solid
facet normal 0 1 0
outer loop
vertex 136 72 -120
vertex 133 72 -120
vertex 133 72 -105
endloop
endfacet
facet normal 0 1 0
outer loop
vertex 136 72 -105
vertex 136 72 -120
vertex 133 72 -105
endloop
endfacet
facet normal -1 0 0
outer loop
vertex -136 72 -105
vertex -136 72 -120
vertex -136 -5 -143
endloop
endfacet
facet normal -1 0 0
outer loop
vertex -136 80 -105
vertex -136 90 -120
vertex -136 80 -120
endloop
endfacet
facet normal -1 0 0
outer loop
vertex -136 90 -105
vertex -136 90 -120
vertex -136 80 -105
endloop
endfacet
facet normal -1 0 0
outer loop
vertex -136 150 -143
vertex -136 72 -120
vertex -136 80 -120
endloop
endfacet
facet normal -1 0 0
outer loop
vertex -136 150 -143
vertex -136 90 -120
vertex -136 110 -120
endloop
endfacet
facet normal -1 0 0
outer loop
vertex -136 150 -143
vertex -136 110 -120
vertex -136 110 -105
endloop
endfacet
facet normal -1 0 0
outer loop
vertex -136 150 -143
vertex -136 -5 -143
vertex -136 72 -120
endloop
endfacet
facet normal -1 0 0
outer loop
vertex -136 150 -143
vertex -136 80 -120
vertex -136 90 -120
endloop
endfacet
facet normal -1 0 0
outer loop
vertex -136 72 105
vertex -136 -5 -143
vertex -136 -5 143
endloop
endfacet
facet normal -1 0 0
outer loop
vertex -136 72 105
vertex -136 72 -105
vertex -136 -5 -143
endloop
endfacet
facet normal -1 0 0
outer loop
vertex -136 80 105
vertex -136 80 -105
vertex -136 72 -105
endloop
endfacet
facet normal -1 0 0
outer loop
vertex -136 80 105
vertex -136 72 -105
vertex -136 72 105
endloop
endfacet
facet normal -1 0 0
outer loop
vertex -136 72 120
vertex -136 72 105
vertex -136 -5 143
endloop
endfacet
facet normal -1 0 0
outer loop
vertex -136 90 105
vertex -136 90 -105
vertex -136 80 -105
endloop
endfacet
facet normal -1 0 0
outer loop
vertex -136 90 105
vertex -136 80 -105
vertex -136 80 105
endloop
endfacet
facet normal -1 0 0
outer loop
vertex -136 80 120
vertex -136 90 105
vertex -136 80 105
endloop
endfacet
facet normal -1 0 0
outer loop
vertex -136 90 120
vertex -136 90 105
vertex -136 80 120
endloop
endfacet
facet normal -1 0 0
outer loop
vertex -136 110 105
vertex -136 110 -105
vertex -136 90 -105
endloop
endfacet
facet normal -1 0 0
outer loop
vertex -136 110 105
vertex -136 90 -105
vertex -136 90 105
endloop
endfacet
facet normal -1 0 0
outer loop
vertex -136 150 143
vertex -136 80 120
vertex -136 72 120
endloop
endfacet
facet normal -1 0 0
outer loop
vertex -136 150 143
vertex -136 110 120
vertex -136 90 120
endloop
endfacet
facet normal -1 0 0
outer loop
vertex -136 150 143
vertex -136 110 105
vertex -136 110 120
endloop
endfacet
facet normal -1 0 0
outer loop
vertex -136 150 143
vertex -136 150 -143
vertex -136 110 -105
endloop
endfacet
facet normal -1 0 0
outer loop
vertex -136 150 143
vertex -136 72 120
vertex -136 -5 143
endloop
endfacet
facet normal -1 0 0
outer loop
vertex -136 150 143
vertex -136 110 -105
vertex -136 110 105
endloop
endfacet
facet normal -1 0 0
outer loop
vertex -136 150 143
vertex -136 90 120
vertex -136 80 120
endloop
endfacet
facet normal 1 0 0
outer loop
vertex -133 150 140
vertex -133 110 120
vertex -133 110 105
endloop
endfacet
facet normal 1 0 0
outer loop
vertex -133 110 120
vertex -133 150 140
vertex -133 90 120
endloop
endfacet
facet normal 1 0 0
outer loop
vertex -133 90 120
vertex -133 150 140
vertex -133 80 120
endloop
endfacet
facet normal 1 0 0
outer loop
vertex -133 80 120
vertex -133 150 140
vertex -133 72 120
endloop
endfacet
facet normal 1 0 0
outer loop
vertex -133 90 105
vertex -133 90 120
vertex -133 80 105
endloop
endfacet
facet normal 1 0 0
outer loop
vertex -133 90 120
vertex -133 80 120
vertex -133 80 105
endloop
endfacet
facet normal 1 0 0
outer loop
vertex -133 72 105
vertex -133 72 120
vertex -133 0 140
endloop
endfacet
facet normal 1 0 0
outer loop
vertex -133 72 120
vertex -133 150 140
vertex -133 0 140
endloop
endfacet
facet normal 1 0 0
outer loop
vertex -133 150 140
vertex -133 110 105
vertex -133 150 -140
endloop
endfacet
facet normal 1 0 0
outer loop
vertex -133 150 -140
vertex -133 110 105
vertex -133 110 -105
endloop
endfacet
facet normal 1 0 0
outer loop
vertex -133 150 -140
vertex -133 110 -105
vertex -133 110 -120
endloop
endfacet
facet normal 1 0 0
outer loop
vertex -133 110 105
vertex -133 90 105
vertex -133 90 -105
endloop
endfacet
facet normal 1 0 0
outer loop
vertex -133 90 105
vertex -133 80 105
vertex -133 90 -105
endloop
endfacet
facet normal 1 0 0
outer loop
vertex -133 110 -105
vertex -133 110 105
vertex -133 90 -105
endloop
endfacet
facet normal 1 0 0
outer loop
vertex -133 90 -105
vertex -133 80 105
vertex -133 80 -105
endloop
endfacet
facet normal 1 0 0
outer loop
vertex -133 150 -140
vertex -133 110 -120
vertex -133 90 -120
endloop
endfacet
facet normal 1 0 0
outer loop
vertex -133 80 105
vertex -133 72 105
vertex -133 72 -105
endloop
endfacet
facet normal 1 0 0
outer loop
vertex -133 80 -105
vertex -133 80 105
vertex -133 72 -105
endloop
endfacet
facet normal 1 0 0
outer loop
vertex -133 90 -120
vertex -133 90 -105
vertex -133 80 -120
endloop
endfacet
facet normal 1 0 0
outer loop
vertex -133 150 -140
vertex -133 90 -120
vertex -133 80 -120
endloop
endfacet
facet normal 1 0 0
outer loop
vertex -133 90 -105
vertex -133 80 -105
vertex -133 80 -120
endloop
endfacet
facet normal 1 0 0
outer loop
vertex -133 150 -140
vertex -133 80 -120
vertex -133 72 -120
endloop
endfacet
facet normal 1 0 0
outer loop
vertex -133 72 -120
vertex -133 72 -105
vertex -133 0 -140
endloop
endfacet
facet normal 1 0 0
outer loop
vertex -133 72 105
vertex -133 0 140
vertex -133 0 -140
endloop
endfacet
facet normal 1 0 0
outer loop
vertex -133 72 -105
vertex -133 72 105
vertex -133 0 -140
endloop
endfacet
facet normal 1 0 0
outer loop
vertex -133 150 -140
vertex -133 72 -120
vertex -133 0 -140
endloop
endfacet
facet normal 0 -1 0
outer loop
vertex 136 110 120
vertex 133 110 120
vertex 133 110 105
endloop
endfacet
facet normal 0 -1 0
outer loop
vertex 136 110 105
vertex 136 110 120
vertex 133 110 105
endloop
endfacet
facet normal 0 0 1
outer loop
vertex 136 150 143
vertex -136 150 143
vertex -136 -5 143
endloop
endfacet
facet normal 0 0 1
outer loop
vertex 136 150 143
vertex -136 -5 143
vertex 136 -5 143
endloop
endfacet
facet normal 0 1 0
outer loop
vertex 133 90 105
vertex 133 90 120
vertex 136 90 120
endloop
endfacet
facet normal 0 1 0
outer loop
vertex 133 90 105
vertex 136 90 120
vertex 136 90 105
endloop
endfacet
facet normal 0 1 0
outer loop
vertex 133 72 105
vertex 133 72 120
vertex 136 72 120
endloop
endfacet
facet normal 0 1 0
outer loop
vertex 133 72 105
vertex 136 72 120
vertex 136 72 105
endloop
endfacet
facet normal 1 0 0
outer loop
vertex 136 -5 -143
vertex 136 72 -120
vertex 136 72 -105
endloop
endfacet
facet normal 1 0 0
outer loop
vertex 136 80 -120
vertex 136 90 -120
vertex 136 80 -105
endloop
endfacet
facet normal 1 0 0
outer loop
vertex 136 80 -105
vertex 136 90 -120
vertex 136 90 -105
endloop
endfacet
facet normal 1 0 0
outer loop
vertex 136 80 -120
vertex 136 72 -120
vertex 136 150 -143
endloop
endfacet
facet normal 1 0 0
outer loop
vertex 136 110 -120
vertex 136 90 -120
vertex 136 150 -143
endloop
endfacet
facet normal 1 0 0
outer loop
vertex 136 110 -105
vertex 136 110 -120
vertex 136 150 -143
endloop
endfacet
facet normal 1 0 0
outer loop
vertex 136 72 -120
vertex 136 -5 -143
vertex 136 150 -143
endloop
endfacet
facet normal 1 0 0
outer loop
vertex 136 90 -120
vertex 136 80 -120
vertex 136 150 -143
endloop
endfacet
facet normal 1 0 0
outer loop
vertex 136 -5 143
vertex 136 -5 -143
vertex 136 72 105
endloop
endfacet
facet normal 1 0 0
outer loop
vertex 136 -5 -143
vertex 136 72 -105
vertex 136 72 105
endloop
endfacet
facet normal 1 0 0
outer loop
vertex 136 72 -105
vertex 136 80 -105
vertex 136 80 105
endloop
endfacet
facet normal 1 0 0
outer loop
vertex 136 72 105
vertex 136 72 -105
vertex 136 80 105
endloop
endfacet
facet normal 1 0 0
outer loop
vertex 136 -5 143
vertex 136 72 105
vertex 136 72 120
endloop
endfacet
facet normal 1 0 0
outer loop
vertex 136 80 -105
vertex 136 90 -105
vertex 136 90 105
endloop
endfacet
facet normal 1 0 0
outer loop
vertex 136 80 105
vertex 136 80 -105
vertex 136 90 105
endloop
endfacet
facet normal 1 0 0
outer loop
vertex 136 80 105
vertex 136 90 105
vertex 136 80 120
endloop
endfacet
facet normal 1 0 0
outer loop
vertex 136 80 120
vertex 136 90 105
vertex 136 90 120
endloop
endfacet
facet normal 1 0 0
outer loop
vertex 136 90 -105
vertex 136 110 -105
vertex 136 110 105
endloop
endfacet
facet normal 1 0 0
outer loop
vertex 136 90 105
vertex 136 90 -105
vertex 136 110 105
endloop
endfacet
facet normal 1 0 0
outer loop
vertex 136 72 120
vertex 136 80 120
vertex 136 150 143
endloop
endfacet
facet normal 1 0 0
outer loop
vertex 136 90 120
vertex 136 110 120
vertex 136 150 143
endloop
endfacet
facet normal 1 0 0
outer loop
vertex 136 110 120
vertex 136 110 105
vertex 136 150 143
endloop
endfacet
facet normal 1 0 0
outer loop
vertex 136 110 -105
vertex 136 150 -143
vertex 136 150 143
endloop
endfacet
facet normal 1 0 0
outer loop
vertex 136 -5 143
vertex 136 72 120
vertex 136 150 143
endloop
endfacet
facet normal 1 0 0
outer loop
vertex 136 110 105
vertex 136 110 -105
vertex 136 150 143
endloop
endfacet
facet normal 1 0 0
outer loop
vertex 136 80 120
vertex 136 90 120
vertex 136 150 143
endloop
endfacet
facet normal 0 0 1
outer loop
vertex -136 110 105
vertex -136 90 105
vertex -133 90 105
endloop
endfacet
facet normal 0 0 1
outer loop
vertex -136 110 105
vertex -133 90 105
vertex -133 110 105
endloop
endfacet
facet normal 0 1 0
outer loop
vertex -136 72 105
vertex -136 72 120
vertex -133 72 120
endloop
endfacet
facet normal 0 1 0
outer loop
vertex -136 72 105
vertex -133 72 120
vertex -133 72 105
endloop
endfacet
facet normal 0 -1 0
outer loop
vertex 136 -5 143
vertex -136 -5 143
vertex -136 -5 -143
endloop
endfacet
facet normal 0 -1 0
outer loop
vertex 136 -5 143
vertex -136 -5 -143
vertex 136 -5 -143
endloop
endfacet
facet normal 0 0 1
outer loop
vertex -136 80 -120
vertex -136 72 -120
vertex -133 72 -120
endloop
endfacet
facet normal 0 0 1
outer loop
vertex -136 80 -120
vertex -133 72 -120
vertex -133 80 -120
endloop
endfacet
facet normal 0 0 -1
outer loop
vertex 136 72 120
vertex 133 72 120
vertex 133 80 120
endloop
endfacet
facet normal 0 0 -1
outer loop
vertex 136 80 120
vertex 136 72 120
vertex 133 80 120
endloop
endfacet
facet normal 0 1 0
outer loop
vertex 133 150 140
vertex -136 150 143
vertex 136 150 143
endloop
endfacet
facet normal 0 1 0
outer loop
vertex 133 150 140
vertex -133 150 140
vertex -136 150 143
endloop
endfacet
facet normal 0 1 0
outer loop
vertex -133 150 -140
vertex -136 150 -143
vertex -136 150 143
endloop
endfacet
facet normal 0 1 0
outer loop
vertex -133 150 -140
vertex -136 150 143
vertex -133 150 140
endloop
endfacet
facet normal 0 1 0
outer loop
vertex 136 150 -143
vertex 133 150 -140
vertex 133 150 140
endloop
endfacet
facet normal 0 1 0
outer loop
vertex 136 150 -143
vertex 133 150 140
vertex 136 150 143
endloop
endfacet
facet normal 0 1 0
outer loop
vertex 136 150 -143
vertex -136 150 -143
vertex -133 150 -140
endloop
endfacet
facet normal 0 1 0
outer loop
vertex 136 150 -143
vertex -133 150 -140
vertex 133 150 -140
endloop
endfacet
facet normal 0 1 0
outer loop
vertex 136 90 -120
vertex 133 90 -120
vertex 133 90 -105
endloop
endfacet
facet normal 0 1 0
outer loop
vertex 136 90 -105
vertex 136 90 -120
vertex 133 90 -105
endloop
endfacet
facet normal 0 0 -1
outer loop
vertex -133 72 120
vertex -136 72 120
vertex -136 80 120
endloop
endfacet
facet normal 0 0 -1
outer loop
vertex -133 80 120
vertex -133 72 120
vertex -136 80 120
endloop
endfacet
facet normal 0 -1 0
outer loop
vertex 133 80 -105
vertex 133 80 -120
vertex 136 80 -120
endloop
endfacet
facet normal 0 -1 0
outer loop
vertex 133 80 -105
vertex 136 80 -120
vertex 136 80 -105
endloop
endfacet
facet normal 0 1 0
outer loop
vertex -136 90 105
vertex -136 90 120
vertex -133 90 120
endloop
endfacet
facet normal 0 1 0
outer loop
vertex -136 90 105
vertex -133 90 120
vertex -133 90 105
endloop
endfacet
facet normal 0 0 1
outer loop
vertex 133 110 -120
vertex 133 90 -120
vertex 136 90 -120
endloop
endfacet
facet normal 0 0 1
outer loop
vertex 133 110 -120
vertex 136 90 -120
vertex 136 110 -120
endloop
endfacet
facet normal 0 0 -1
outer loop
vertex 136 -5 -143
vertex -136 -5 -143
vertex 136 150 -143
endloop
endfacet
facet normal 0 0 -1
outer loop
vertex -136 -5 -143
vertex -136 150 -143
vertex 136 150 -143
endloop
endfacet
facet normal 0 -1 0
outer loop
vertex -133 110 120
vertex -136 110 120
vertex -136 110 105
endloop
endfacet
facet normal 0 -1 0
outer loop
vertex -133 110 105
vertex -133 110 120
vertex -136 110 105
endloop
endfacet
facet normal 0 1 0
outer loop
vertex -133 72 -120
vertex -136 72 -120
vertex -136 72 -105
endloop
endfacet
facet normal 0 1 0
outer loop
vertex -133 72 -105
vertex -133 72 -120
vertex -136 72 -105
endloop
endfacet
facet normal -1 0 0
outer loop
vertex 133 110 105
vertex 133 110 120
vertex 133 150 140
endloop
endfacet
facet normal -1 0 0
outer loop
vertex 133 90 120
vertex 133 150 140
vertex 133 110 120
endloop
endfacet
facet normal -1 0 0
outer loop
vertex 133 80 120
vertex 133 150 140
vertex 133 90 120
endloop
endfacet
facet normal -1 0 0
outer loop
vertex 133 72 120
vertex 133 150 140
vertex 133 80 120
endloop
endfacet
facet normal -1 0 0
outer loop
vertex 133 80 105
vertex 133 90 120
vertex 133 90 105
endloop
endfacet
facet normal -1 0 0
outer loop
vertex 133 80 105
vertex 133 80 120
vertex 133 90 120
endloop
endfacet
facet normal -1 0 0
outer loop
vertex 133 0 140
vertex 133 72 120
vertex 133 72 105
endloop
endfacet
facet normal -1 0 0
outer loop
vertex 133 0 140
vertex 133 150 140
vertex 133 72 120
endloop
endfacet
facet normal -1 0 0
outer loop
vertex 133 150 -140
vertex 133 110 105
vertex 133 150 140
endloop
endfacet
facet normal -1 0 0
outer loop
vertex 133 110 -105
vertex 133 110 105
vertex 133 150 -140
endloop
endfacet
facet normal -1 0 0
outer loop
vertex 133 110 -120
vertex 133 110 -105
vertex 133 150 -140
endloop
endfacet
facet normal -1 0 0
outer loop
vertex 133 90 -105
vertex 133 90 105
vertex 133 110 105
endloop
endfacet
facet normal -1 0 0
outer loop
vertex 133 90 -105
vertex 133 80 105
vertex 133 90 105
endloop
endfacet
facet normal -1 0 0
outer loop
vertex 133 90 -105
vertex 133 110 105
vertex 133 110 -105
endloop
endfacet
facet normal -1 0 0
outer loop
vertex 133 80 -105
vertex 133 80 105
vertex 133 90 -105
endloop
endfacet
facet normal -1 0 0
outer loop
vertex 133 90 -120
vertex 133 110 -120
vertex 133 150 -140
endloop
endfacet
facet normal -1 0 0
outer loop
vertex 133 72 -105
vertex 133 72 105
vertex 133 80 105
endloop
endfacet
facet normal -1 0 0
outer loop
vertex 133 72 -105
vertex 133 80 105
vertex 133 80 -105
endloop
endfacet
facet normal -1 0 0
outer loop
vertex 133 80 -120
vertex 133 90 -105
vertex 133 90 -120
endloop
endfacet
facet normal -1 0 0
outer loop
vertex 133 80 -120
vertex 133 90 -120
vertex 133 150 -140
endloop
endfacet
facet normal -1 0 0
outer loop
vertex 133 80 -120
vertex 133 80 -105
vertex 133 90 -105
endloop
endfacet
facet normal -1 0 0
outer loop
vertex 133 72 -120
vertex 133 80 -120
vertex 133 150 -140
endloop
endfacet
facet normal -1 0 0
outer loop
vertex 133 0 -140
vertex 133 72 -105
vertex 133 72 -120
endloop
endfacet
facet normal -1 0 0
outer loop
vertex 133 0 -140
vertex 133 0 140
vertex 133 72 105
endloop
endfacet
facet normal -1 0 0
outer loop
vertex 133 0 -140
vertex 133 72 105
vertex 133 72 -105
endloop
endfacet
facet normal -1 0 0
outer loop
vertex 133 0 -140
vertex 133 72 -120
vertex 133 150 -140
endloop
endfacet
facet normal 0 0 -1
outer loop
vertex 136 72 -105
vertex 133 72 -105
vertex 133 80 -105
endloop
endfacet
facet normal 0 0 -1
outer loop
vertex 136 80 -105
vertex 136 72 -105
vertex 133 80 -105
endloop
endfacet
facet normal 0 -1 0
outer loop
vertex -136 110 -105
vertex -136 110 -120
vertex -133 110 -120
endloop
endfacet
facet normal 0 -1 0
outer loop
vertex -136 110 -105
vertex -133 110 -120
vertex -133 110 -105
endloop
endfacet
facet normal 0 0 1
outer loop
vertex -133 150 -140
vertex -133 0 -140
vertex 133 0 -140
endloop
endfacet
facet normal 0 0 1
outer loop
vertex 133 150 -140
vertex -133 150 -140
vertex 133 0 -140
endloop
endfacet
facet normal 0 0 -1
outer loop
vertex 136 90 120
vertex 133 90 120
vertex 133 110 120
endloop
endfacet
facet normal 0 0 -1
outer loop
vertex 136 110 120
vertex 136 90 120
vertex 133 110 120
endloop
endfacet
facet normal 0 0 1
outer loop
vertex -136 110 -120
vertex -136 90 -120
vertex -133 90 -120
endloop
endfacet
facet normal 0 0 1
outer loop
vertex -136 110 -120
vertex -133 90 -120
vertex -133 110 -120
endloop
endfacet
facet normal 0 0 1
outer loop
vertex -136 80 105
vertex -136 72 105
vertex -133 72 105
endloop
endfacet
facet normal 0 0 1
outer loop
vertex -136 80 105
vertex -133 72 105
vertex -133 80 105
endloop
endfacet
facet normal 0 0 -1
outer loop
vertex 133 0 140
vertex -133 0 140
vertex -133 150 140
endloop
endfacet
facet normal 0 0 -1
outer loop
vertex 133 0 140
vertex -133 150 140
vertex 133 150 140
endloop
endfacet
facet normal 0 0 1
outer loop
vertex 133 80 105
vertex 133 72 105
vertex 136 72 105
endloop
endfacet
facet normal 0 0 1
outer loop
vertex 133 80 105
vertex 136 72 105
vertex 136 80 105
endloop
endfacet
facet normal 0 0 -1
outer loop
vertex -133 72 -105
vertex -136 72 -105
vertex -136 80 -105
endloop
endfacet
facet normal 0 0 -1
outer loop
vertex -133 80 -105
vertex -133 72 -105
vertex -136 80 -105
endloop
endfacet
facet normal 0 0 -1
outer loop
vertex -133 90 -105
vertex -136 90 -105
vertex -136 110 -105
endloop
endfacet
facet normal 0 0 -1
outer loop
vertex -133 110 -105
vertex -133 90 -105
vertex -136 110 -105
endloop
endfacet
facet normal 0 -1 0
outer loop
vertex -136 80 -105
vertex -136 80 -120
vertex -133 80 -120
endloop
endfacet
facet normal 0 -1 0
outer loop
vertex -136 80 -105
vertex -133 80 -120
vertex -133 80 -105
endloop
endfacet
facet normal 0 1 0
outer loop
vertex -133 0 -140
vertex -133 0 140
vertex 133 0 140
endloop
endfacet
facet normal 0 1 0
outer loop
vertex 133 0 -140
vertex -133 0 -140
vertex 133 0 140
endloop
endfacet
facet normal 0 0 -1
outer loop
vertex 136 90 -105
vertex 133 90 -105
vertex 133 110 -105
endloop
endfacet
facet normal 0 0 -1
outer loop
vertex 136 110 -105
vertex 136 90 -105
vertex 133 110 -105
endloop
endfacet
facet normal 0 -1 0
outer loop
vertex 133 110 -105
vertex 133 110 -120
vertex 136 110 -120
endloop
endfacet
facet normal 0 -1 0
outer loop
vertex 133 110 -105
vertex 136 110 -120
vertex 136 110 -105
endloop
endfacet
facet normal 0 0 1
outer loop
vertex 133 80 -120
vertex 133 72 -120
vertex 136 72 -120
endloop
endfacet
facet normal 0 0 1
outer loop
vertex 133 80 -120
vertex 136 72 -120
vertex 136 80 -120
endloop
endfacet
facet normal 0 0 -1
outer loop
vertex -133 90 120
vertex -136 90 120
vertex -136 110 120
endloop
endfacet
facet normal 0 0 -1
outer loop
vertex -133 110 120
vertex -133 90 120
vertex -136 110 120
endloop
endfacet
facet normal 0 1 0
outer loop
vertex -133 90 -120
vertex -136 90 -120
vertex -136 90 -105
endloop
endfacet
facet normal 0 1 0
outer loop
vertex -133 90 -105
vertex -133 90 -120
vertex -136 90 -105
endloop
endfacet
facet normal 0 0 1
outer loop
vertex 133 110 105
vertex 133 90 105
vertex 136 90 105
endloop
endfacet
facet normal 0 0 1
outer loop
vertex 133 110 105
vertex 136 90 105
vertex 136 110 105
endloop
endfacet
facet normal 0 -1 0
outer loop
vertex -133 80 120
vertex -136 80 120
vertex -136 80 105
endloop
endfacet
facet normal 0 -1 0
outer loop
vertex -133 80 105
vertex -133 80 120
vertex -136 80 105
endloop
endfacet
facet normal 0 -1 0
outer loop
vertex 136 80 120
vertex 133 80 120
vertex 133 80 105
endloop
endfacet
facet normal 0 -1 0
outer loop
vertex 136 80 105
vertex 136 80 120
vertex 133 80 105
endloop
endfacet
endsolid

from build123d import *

# Parameters (mm, degrees)
SKETCH_1_W          = 272
SKETCH_1_H          = 286
SKETCH_1_W_2        = 266
SKETCH_1_H_2        = 280
EXTRUDE_1_DEPTH     = 150
SKETCH_2_W          = 272
SKETCH_2_H          = 286
EXTRUDE_2_DEPTH     = 5
SKETCH_3_W          = 15
SKETCH_3_H          = 8
SKETCH_3_H_2        = 20
CUT_EXTRUDE_1_DEPTH = 342.954675359


with BuildPart() as part:
    # 草圖1 → 填料-伸長1 (new body)
    with BuildSketch(Plane(origin=(0, 0, 0), x_dir=(1, 0, 0), z_dir=(0, 1, 0))):
        Rectangle(SKETCH_1_W, SKETCH_1_H)
        Rectangle(SKETCH_1_W_2, SKETCH_1_H_2, mode=Mode.SUBTRACT)
    extrude(amount=EXTRUDE_1_DEPTH)

    # 草圖2 → 填料-伸長2 (add)
    with BuildSketch(Plane.XZ):
        Rectangle(SKETCH_2_W, SKETCH_2_H)
    extrude(amount=EXTRUDE_2_DEPTH)

    # 草圖3 → 除料-伸長1 (cut, through all)
    with BuildSketch(Plane.ZY.offset(136)):
        with Locations((-112.5, 76)):
            Rectangle(SKETCH_3_W, SKETCH_3_H)
        with Locations((-112.5, 100)):
            Rectangle(SKETCH_3_W, SKETCH_3_H_2)
    cut_extrude_1 = extrude(amount=-CUT_EXTRUDE_1_DEPTH, mode=Mode.SUBTRACT)

    # 鏡射1: 除料-伸長1 across plane
    add(cut_extrude_1.mirror(Plane.XY), mode=Mode.SUBTRACT)


solid = part.part
